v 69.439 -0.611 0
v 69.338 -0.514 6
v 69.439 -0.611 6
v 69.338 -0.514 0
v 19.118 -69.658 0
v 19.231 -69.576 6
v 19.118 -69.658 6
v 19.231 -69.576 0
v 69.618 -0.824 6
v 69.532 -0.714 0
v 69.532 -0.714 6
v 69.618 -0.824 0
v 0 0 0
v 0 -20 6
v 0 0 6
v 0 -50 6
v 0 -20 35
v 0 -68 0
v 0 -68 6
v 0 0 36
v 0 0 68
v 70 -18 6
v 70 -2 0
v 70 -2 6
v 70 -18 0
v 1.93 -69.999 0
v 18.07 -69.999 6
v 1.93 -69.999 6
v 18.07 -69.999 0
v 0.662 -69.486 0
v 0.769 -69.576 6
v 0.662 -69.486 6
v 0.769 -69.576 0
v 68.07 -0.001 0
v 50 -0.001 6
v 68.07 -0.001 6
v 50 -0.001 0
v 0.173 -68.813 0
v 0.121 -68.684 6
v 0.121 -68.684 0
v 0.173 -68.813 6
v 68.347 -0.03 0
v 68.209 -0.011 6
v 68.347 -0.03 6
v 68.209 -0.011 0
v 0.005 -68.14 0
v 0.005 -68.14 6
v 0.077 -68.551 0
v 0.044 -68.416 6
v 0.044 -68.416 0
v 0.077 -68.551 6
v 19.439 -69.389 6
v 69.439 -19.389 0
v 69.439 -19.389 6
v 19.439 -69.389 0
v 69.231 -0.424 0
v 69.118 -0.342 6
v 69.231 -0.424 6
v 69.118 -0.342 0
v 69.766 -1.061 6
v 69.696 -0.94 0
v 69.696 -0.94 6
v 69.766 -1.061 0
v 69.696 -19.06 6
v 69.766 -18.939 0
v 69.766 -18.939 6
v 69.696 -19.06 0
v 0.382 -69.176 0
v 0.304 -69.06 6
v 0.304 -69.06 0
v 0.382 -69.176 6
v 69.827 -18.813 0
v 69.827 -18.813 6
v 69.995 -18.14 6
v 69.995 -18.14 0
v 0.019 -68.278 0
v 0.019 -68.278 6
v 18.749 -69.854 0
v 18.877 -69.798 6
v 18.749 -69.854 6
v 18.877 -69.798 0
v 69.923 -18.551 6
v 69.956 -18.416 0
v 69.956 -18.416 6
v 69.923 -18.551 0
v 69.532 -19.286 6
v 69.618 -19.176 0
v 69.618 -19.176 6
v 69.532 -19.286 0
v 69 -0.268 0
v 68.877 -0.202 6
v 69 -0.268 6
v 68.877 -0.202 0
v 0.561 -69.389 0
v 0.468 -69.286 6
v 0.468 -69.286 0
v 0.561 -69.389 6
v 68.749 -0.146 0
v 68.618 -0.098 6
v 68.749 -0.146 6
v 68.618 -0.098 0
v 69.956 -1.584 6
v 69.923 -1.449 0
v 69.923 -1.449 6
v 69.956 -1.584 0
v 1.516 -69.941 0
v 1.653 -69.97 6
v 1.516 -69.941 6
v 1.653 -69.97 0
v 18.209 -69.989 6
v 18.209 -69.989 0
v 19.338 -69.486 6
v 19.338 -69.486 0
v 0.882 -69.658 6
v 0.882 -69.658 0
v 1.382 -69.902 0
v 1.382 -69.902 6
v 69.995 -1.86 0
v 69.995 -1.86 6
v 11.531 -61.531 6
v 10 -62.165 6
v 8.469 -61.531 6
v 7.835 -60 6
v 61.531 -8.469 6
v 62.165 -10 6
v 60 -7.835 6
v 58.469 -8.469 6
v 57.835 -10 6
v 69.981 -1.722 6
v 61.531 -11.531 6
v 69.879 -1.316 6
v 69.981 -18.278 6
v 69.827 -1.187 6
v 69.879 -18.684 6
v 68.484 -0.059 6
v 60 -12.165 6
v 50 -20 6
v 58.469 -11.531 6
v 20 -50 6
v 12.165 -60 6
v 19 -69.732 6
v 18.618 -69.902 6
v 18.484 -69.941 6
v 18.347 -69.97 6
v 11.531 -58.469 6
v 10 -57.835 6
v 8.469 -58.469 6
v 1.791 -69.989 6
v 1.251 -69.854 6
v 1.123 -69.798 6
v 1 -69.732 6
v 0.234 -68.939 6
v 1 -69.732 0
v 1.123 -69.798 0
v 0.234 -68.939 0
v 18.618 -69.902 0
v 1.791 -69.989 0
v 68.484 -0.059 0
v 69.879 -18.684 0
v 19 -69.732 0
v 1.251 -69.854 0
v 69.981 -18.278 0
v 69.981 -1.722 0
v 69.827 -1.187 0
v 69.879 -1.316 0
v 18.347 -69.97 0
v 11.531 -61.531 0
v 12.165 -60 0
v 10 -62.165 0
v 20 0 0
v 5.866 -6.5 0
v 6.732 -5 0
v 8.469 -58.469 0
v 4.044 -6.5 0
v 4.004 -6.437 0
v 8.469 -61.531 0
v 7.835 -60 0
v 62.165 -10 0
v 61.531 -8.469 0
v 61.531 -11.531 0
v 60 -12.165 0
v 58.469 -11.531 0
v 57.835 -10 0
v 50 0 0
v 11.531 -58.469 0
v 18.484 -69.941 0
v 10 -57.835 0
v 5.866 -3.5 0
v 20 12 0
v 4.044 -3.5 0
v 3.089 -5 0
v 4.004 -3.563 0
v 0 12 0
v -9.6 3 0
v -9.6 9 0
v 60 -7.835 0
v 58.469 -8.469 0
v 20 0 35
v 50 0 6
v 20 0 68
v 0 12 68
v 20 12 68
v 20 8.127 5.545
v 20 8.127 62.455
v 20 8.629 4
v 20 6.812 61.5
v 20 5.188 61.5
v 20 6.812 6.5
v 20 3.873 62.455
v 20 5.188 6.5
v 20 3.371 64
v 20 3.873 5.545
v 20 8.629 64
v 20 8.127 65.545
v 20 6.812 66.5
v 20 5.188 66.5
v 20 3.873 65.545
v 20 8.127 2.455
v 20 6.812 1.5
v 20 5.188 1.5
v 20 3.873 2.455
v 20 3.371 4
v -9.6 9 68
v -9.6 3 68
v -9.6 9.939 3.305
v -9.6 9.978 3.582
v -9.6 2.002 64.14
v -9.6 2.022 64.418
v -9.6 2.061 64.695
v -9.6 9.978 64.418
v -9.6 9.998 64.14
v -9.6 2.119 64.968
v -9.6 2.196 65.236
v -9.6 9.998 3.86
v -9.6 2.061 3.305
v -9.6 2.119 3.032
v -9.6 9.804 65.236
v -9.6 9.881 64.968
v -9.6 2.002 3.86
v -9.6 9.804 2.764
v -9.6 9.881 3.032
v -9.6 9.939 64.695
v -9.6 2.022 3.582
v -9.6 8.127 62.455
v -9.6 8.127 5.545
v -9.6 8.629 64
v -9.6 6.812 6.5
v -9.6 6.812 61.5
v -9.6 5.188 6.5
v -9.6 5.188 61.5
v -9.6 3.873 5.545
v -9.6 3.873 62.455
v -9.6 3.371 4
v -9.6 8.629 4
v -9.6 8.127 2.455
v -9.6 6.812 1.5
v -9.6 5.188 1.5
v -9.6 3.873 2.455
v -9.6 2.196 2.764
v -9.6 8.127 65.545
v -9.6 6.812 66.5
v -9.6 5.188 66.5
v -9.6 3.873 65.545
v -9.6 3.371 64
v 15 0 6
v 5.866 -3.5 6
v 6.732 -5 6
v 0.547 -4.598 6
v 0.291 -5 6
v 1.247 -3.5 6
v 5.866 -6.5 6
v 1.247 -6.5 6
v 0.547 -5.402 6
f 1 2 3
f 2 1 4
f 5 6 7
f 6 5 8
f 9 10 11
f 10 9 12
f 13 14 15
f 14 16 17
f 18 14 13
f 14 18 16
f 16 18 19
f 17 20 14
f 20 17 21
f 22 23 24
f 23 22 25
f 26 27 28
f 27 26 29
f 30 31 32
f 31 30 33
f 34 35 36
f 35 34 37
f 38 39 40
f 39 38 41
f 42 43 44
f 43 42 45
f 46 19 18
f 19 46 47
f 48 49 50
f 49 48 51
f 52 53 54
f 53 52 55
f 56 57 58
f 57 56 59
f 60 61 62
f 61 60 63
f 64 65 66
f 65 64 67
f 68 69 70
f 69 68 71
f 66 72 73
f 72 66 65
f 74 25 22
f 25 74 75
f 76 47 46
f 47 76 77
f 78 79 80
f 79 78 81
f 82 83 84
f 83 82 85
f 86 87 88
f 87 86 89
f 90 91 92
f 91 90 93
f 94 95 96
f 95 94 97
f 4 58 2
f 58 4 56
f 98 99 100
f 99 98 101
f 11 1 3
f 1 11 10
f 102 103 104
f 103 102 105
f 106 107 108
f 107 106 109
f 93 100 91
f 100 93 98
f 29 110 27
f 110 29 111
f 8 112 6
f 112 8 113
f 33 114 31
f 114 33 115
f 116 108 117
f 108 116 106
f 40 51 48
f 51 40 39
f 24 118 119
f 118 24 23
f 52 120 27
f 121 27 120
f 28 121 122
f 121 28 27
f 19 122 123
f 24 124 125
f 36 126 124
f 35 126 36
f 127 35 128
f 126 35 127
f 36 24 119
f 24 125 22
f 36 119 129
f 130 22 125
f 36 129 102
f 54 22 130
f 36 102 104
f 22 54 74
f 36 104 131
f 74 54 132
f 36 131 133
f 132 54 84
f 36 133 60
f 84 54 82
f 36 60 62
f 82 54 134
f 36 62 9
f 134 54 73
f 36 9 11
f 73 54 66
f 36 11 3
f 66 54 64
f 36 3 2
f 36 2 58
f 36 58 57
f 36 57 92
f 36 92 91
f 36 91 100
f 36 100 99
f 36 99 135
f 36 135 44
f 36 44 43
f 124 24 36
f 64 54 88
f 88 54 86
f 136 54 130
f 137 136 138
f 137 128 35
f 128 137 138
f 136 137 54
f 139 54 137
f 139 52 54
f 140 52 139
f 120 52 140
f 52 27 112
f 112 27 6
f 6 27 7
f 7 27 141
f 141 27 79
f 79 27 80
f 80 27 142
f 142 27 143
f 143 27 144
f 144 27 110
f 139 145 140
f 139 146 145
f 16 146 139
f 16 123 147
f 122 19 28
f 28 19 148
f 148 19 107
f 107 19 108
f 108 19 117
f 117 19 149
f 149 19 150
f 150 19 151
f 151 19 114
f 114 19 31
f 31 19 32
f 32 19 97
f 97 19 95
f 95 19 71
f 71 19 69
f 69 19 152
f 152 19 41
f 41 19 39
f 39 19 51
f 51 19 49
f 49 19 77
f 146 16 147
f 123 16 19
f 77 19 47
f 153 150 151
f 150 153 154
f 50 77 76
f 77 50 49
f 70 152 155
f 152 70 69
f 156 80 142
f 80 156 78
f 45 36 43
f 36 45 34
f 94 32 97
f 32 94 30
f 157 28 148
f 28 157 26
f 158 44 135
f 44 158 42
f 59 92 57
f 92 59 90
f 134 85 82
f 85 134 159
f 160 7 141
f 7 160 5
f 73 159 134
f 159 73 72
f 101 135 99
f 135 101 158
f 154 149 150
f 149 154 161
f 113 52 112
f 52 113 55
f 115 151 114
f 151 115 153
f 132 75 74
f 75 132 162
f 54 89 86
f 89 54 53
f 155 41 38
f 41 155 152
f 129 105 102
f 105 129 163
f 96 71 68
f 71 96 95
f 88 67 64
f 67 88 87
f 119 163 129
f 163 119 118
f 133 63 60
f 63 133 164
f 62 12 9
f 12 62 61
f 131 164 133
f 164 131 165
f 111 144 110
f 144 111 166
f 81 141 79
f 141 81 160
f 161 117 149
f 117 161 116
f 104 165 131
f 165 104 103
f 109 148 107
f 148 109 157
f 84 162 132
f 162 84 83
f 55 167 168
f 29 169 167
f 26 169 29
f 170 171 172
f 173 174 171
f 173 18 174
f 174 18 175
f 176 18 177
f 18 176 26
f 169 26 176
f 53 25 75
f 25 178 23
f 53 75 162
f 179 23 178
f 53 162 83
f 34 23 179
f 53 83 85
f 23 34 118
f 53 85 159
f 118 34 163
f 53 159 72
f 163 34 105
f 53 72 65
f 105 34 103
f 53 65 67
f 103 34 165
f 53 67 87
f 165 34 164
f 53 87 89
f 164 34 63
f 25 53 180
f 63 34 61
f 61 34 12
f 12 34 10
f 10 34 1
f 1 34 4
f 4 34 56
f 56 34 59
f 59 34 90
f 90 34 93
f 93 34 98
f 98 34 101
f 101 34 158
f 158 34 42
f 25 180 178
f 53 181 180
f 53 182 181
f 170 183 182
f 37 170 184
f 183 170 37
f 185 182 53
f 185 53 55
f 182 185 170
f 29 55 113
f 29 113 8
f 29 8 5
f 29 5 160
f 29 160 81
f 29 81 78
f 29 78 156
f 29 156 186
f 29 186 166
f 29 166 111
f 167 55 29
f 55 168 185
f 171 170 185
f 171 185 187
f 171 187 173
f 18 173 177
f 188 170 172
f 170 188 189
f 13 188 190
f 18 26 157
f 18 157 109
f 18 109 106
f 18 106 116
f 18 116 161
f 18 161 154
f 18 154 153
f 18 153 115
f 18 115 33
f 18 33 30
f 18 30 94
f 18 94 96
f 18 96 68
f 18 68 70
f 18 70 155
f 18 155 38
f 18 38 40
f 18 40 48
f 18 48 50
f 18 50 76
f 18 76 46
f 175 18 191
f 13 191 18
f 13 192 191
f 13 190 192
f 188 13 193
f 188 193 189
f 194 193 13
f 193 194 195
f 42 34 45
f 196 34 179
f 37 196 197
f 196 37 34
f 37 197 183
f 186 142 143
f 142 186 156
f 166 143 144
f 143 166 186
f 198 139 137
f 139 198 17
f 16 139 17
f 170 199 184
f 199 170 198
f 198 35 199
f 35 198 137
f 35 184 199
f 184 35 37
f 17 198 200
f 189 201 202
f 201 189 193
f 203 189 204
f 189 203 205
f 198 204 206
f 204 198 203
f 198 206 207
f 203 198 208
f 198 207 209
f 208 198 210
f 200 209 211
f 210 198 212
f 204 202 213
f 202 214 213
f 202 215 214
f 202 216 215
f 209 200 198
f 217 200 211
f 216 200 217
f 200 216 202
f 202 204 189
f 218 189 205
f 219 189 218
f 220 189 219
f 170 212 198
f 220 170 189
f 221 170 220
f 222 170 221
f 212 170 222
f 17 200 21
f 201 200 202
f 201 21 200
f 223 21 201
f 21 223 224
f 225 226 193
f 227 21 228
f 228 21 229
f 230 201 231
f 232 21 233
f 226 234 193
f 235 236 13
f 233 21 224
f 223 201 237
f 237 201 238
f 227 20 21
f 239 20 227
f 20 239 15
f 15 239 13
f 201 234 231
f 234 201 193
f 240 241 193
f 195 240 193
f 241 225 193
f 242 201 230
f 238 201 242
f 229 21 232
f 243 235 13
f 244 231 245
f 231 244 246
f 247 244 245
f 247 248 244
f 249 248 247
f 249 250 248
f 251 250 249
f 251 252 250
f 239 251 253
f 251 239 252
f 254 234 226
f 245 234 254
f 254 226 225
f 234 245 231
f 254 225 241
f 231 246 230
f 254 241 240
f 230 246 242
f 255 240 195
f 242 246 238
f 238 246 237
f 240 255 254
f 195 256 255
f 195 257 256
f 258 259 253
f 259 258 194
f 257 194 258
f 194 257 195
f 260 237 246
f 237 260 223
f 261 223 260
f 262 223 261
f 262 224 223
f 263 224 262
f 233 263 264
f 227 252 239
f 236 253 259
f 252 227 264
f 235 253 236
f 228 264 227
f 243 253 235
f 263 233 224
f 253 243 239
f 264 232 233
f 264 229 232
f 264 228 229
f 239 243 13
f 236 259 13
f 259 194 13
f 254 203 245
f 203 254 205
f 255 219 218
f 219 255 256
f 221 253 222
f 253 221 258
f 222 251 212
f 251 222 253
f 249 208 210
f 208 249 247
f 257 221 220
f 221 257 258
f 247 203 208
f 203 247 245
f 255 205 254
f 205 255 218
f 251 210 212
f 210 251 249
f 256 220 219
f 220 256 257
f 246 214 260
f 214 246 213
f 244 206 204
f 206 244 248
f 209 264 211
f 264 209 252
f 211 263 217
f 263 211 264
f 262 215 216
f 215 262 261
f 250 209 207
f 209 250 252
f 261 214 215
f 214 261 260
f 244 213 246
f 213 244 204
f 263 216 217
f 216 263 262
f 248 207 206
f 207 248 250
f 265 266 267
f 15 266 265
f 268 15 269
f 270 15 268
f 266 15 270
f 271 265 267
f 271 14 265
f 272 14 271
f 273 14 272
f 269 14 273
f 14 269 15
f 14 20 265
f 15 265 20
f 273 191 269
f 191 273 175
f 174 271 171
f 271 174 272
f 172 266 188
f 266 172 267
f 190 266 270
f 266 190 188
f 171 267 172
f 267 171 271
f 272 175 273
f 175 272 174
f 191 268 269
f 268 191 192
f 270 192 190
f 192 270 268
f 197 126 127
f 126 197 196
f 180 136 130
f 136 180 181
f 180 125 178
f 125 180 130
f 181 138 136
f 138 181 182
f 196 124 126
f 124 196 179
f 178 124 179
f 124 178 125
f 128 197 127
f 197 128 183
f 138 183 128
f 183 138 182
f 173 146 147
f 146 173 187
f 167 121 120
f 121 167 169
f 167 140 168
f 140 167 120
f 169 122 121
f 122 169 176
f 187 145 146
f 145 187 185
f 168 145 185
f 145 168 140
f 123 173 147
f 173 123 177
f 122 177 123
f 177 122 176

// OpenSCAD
// file: polyhole.scad
// The Cylinder is dead! Long live the Cylinder!
// A module for a polyhole by radius, based on Nophead's work.

module polyhole(h, r)
{
    n = max(round(4 * r), 3);
    cylinder(h = h, r = r / cos(180 / n), $fn = n);
}
// file: BedMountC.scad
// A corner mount for the bed, which uses two V wheels. Uses 40mm m5 bolts to mount the wheels

use<polyhole.scad>

BedMountC();

module BedMountC()
{
    difference()
    {
        union()
        {
            hull()
            {
                translate([10, 10, 3])
                    cube([20, 20, 6], center = true);
                translate([68, 2, 0])
                    cylinder(h = 6, r = 2, $fn = 90);
                translate([68, 18, 0])
                    cylinder(h = 6, r = 2, $fn = 90);
                translate([2, 68, 0])
                    cylinder(h = 6, r = 2, $fn = 90);
                translate([18, 68, 0])
                    cylinder(h = 6, r = 2, $fn = 90);
            }
            hull()
            {
                linear_extrude(height = 35)
                    polygon([[0, 0], [20, 0], [0, 20]]);
                linear_extrude(height = 6)
                    polygon([[0, 0], [50, 0], [50, 20], [20, 50], [0, 50]]);
            }
            hull()
            {
                linear_extrude(height = 35)
                    polygon([[0, 0], [20, 0], [0, 20]]);
                linear_extrude(height = 68)
                    polygon([[0, -12], [20, -12], [20, 0], [0, 0]]);
            }
            linear_extrude(height = 20)
                polygon([[0, -12], [20, -12], [20, 0], [0, 0]]);
            hull()
            {
                hull()
                {
                    dist = 5; //distance from edge of bed to v slot extrusion
                    translate([-dist, -6, 1])
                        cube([(10-5.40)*2, 6, 2], center = true);
                    translate([-dist, -6, 4])
                        rotate([0, 90, 0])
                            cylinder(h = (10-5.40)*2, r = 4, $fn = 90, center = true);
                    translate([-dist, -6, 64])
                        rotate([0, 90, 0])
                            cylinder(h = (10-5.40)*2, r = 4, $fn = 90, center = true);
                    translate([-dist, -6, 67])
                        cube([(10-5.40)*2, 6, 2], center = true);
                }
                linear_extrude(height = 68)
                    polygon([[0, -12], [20, -12], [20, 0], [0, 0]]);
            }
        }
        translate([20, -6, 4])
            rotate([90, 0, -90])
                polyhole(30, 2.5);
        translate([20, -6, 64])
            rotate([90, 0, -90])
                polyhole(30, 2.5);
        translate([0, 0, 6])
            linear_extrude(height = 30, scale = 0)
                polygon([[0, 0], [15, 0], [0, 20]]);
        hull()
        {
            translate([5, 5, 0])
                polyhole(6, 1.5);
            translate([5, 5, 0])
                rotate([0, -25, 0])
                    polyhole(10, 1.5);
        }
        translate([60, 10, 0])
            polyhole(6, 2);
        translate([10, 60, 0])
            polyhole(6, 2);
    }
}
// main file
//Other side of the bed mount with two wheels

use<BedMountC.scad>

scale([1, -1, 1])
    BedMountC();
